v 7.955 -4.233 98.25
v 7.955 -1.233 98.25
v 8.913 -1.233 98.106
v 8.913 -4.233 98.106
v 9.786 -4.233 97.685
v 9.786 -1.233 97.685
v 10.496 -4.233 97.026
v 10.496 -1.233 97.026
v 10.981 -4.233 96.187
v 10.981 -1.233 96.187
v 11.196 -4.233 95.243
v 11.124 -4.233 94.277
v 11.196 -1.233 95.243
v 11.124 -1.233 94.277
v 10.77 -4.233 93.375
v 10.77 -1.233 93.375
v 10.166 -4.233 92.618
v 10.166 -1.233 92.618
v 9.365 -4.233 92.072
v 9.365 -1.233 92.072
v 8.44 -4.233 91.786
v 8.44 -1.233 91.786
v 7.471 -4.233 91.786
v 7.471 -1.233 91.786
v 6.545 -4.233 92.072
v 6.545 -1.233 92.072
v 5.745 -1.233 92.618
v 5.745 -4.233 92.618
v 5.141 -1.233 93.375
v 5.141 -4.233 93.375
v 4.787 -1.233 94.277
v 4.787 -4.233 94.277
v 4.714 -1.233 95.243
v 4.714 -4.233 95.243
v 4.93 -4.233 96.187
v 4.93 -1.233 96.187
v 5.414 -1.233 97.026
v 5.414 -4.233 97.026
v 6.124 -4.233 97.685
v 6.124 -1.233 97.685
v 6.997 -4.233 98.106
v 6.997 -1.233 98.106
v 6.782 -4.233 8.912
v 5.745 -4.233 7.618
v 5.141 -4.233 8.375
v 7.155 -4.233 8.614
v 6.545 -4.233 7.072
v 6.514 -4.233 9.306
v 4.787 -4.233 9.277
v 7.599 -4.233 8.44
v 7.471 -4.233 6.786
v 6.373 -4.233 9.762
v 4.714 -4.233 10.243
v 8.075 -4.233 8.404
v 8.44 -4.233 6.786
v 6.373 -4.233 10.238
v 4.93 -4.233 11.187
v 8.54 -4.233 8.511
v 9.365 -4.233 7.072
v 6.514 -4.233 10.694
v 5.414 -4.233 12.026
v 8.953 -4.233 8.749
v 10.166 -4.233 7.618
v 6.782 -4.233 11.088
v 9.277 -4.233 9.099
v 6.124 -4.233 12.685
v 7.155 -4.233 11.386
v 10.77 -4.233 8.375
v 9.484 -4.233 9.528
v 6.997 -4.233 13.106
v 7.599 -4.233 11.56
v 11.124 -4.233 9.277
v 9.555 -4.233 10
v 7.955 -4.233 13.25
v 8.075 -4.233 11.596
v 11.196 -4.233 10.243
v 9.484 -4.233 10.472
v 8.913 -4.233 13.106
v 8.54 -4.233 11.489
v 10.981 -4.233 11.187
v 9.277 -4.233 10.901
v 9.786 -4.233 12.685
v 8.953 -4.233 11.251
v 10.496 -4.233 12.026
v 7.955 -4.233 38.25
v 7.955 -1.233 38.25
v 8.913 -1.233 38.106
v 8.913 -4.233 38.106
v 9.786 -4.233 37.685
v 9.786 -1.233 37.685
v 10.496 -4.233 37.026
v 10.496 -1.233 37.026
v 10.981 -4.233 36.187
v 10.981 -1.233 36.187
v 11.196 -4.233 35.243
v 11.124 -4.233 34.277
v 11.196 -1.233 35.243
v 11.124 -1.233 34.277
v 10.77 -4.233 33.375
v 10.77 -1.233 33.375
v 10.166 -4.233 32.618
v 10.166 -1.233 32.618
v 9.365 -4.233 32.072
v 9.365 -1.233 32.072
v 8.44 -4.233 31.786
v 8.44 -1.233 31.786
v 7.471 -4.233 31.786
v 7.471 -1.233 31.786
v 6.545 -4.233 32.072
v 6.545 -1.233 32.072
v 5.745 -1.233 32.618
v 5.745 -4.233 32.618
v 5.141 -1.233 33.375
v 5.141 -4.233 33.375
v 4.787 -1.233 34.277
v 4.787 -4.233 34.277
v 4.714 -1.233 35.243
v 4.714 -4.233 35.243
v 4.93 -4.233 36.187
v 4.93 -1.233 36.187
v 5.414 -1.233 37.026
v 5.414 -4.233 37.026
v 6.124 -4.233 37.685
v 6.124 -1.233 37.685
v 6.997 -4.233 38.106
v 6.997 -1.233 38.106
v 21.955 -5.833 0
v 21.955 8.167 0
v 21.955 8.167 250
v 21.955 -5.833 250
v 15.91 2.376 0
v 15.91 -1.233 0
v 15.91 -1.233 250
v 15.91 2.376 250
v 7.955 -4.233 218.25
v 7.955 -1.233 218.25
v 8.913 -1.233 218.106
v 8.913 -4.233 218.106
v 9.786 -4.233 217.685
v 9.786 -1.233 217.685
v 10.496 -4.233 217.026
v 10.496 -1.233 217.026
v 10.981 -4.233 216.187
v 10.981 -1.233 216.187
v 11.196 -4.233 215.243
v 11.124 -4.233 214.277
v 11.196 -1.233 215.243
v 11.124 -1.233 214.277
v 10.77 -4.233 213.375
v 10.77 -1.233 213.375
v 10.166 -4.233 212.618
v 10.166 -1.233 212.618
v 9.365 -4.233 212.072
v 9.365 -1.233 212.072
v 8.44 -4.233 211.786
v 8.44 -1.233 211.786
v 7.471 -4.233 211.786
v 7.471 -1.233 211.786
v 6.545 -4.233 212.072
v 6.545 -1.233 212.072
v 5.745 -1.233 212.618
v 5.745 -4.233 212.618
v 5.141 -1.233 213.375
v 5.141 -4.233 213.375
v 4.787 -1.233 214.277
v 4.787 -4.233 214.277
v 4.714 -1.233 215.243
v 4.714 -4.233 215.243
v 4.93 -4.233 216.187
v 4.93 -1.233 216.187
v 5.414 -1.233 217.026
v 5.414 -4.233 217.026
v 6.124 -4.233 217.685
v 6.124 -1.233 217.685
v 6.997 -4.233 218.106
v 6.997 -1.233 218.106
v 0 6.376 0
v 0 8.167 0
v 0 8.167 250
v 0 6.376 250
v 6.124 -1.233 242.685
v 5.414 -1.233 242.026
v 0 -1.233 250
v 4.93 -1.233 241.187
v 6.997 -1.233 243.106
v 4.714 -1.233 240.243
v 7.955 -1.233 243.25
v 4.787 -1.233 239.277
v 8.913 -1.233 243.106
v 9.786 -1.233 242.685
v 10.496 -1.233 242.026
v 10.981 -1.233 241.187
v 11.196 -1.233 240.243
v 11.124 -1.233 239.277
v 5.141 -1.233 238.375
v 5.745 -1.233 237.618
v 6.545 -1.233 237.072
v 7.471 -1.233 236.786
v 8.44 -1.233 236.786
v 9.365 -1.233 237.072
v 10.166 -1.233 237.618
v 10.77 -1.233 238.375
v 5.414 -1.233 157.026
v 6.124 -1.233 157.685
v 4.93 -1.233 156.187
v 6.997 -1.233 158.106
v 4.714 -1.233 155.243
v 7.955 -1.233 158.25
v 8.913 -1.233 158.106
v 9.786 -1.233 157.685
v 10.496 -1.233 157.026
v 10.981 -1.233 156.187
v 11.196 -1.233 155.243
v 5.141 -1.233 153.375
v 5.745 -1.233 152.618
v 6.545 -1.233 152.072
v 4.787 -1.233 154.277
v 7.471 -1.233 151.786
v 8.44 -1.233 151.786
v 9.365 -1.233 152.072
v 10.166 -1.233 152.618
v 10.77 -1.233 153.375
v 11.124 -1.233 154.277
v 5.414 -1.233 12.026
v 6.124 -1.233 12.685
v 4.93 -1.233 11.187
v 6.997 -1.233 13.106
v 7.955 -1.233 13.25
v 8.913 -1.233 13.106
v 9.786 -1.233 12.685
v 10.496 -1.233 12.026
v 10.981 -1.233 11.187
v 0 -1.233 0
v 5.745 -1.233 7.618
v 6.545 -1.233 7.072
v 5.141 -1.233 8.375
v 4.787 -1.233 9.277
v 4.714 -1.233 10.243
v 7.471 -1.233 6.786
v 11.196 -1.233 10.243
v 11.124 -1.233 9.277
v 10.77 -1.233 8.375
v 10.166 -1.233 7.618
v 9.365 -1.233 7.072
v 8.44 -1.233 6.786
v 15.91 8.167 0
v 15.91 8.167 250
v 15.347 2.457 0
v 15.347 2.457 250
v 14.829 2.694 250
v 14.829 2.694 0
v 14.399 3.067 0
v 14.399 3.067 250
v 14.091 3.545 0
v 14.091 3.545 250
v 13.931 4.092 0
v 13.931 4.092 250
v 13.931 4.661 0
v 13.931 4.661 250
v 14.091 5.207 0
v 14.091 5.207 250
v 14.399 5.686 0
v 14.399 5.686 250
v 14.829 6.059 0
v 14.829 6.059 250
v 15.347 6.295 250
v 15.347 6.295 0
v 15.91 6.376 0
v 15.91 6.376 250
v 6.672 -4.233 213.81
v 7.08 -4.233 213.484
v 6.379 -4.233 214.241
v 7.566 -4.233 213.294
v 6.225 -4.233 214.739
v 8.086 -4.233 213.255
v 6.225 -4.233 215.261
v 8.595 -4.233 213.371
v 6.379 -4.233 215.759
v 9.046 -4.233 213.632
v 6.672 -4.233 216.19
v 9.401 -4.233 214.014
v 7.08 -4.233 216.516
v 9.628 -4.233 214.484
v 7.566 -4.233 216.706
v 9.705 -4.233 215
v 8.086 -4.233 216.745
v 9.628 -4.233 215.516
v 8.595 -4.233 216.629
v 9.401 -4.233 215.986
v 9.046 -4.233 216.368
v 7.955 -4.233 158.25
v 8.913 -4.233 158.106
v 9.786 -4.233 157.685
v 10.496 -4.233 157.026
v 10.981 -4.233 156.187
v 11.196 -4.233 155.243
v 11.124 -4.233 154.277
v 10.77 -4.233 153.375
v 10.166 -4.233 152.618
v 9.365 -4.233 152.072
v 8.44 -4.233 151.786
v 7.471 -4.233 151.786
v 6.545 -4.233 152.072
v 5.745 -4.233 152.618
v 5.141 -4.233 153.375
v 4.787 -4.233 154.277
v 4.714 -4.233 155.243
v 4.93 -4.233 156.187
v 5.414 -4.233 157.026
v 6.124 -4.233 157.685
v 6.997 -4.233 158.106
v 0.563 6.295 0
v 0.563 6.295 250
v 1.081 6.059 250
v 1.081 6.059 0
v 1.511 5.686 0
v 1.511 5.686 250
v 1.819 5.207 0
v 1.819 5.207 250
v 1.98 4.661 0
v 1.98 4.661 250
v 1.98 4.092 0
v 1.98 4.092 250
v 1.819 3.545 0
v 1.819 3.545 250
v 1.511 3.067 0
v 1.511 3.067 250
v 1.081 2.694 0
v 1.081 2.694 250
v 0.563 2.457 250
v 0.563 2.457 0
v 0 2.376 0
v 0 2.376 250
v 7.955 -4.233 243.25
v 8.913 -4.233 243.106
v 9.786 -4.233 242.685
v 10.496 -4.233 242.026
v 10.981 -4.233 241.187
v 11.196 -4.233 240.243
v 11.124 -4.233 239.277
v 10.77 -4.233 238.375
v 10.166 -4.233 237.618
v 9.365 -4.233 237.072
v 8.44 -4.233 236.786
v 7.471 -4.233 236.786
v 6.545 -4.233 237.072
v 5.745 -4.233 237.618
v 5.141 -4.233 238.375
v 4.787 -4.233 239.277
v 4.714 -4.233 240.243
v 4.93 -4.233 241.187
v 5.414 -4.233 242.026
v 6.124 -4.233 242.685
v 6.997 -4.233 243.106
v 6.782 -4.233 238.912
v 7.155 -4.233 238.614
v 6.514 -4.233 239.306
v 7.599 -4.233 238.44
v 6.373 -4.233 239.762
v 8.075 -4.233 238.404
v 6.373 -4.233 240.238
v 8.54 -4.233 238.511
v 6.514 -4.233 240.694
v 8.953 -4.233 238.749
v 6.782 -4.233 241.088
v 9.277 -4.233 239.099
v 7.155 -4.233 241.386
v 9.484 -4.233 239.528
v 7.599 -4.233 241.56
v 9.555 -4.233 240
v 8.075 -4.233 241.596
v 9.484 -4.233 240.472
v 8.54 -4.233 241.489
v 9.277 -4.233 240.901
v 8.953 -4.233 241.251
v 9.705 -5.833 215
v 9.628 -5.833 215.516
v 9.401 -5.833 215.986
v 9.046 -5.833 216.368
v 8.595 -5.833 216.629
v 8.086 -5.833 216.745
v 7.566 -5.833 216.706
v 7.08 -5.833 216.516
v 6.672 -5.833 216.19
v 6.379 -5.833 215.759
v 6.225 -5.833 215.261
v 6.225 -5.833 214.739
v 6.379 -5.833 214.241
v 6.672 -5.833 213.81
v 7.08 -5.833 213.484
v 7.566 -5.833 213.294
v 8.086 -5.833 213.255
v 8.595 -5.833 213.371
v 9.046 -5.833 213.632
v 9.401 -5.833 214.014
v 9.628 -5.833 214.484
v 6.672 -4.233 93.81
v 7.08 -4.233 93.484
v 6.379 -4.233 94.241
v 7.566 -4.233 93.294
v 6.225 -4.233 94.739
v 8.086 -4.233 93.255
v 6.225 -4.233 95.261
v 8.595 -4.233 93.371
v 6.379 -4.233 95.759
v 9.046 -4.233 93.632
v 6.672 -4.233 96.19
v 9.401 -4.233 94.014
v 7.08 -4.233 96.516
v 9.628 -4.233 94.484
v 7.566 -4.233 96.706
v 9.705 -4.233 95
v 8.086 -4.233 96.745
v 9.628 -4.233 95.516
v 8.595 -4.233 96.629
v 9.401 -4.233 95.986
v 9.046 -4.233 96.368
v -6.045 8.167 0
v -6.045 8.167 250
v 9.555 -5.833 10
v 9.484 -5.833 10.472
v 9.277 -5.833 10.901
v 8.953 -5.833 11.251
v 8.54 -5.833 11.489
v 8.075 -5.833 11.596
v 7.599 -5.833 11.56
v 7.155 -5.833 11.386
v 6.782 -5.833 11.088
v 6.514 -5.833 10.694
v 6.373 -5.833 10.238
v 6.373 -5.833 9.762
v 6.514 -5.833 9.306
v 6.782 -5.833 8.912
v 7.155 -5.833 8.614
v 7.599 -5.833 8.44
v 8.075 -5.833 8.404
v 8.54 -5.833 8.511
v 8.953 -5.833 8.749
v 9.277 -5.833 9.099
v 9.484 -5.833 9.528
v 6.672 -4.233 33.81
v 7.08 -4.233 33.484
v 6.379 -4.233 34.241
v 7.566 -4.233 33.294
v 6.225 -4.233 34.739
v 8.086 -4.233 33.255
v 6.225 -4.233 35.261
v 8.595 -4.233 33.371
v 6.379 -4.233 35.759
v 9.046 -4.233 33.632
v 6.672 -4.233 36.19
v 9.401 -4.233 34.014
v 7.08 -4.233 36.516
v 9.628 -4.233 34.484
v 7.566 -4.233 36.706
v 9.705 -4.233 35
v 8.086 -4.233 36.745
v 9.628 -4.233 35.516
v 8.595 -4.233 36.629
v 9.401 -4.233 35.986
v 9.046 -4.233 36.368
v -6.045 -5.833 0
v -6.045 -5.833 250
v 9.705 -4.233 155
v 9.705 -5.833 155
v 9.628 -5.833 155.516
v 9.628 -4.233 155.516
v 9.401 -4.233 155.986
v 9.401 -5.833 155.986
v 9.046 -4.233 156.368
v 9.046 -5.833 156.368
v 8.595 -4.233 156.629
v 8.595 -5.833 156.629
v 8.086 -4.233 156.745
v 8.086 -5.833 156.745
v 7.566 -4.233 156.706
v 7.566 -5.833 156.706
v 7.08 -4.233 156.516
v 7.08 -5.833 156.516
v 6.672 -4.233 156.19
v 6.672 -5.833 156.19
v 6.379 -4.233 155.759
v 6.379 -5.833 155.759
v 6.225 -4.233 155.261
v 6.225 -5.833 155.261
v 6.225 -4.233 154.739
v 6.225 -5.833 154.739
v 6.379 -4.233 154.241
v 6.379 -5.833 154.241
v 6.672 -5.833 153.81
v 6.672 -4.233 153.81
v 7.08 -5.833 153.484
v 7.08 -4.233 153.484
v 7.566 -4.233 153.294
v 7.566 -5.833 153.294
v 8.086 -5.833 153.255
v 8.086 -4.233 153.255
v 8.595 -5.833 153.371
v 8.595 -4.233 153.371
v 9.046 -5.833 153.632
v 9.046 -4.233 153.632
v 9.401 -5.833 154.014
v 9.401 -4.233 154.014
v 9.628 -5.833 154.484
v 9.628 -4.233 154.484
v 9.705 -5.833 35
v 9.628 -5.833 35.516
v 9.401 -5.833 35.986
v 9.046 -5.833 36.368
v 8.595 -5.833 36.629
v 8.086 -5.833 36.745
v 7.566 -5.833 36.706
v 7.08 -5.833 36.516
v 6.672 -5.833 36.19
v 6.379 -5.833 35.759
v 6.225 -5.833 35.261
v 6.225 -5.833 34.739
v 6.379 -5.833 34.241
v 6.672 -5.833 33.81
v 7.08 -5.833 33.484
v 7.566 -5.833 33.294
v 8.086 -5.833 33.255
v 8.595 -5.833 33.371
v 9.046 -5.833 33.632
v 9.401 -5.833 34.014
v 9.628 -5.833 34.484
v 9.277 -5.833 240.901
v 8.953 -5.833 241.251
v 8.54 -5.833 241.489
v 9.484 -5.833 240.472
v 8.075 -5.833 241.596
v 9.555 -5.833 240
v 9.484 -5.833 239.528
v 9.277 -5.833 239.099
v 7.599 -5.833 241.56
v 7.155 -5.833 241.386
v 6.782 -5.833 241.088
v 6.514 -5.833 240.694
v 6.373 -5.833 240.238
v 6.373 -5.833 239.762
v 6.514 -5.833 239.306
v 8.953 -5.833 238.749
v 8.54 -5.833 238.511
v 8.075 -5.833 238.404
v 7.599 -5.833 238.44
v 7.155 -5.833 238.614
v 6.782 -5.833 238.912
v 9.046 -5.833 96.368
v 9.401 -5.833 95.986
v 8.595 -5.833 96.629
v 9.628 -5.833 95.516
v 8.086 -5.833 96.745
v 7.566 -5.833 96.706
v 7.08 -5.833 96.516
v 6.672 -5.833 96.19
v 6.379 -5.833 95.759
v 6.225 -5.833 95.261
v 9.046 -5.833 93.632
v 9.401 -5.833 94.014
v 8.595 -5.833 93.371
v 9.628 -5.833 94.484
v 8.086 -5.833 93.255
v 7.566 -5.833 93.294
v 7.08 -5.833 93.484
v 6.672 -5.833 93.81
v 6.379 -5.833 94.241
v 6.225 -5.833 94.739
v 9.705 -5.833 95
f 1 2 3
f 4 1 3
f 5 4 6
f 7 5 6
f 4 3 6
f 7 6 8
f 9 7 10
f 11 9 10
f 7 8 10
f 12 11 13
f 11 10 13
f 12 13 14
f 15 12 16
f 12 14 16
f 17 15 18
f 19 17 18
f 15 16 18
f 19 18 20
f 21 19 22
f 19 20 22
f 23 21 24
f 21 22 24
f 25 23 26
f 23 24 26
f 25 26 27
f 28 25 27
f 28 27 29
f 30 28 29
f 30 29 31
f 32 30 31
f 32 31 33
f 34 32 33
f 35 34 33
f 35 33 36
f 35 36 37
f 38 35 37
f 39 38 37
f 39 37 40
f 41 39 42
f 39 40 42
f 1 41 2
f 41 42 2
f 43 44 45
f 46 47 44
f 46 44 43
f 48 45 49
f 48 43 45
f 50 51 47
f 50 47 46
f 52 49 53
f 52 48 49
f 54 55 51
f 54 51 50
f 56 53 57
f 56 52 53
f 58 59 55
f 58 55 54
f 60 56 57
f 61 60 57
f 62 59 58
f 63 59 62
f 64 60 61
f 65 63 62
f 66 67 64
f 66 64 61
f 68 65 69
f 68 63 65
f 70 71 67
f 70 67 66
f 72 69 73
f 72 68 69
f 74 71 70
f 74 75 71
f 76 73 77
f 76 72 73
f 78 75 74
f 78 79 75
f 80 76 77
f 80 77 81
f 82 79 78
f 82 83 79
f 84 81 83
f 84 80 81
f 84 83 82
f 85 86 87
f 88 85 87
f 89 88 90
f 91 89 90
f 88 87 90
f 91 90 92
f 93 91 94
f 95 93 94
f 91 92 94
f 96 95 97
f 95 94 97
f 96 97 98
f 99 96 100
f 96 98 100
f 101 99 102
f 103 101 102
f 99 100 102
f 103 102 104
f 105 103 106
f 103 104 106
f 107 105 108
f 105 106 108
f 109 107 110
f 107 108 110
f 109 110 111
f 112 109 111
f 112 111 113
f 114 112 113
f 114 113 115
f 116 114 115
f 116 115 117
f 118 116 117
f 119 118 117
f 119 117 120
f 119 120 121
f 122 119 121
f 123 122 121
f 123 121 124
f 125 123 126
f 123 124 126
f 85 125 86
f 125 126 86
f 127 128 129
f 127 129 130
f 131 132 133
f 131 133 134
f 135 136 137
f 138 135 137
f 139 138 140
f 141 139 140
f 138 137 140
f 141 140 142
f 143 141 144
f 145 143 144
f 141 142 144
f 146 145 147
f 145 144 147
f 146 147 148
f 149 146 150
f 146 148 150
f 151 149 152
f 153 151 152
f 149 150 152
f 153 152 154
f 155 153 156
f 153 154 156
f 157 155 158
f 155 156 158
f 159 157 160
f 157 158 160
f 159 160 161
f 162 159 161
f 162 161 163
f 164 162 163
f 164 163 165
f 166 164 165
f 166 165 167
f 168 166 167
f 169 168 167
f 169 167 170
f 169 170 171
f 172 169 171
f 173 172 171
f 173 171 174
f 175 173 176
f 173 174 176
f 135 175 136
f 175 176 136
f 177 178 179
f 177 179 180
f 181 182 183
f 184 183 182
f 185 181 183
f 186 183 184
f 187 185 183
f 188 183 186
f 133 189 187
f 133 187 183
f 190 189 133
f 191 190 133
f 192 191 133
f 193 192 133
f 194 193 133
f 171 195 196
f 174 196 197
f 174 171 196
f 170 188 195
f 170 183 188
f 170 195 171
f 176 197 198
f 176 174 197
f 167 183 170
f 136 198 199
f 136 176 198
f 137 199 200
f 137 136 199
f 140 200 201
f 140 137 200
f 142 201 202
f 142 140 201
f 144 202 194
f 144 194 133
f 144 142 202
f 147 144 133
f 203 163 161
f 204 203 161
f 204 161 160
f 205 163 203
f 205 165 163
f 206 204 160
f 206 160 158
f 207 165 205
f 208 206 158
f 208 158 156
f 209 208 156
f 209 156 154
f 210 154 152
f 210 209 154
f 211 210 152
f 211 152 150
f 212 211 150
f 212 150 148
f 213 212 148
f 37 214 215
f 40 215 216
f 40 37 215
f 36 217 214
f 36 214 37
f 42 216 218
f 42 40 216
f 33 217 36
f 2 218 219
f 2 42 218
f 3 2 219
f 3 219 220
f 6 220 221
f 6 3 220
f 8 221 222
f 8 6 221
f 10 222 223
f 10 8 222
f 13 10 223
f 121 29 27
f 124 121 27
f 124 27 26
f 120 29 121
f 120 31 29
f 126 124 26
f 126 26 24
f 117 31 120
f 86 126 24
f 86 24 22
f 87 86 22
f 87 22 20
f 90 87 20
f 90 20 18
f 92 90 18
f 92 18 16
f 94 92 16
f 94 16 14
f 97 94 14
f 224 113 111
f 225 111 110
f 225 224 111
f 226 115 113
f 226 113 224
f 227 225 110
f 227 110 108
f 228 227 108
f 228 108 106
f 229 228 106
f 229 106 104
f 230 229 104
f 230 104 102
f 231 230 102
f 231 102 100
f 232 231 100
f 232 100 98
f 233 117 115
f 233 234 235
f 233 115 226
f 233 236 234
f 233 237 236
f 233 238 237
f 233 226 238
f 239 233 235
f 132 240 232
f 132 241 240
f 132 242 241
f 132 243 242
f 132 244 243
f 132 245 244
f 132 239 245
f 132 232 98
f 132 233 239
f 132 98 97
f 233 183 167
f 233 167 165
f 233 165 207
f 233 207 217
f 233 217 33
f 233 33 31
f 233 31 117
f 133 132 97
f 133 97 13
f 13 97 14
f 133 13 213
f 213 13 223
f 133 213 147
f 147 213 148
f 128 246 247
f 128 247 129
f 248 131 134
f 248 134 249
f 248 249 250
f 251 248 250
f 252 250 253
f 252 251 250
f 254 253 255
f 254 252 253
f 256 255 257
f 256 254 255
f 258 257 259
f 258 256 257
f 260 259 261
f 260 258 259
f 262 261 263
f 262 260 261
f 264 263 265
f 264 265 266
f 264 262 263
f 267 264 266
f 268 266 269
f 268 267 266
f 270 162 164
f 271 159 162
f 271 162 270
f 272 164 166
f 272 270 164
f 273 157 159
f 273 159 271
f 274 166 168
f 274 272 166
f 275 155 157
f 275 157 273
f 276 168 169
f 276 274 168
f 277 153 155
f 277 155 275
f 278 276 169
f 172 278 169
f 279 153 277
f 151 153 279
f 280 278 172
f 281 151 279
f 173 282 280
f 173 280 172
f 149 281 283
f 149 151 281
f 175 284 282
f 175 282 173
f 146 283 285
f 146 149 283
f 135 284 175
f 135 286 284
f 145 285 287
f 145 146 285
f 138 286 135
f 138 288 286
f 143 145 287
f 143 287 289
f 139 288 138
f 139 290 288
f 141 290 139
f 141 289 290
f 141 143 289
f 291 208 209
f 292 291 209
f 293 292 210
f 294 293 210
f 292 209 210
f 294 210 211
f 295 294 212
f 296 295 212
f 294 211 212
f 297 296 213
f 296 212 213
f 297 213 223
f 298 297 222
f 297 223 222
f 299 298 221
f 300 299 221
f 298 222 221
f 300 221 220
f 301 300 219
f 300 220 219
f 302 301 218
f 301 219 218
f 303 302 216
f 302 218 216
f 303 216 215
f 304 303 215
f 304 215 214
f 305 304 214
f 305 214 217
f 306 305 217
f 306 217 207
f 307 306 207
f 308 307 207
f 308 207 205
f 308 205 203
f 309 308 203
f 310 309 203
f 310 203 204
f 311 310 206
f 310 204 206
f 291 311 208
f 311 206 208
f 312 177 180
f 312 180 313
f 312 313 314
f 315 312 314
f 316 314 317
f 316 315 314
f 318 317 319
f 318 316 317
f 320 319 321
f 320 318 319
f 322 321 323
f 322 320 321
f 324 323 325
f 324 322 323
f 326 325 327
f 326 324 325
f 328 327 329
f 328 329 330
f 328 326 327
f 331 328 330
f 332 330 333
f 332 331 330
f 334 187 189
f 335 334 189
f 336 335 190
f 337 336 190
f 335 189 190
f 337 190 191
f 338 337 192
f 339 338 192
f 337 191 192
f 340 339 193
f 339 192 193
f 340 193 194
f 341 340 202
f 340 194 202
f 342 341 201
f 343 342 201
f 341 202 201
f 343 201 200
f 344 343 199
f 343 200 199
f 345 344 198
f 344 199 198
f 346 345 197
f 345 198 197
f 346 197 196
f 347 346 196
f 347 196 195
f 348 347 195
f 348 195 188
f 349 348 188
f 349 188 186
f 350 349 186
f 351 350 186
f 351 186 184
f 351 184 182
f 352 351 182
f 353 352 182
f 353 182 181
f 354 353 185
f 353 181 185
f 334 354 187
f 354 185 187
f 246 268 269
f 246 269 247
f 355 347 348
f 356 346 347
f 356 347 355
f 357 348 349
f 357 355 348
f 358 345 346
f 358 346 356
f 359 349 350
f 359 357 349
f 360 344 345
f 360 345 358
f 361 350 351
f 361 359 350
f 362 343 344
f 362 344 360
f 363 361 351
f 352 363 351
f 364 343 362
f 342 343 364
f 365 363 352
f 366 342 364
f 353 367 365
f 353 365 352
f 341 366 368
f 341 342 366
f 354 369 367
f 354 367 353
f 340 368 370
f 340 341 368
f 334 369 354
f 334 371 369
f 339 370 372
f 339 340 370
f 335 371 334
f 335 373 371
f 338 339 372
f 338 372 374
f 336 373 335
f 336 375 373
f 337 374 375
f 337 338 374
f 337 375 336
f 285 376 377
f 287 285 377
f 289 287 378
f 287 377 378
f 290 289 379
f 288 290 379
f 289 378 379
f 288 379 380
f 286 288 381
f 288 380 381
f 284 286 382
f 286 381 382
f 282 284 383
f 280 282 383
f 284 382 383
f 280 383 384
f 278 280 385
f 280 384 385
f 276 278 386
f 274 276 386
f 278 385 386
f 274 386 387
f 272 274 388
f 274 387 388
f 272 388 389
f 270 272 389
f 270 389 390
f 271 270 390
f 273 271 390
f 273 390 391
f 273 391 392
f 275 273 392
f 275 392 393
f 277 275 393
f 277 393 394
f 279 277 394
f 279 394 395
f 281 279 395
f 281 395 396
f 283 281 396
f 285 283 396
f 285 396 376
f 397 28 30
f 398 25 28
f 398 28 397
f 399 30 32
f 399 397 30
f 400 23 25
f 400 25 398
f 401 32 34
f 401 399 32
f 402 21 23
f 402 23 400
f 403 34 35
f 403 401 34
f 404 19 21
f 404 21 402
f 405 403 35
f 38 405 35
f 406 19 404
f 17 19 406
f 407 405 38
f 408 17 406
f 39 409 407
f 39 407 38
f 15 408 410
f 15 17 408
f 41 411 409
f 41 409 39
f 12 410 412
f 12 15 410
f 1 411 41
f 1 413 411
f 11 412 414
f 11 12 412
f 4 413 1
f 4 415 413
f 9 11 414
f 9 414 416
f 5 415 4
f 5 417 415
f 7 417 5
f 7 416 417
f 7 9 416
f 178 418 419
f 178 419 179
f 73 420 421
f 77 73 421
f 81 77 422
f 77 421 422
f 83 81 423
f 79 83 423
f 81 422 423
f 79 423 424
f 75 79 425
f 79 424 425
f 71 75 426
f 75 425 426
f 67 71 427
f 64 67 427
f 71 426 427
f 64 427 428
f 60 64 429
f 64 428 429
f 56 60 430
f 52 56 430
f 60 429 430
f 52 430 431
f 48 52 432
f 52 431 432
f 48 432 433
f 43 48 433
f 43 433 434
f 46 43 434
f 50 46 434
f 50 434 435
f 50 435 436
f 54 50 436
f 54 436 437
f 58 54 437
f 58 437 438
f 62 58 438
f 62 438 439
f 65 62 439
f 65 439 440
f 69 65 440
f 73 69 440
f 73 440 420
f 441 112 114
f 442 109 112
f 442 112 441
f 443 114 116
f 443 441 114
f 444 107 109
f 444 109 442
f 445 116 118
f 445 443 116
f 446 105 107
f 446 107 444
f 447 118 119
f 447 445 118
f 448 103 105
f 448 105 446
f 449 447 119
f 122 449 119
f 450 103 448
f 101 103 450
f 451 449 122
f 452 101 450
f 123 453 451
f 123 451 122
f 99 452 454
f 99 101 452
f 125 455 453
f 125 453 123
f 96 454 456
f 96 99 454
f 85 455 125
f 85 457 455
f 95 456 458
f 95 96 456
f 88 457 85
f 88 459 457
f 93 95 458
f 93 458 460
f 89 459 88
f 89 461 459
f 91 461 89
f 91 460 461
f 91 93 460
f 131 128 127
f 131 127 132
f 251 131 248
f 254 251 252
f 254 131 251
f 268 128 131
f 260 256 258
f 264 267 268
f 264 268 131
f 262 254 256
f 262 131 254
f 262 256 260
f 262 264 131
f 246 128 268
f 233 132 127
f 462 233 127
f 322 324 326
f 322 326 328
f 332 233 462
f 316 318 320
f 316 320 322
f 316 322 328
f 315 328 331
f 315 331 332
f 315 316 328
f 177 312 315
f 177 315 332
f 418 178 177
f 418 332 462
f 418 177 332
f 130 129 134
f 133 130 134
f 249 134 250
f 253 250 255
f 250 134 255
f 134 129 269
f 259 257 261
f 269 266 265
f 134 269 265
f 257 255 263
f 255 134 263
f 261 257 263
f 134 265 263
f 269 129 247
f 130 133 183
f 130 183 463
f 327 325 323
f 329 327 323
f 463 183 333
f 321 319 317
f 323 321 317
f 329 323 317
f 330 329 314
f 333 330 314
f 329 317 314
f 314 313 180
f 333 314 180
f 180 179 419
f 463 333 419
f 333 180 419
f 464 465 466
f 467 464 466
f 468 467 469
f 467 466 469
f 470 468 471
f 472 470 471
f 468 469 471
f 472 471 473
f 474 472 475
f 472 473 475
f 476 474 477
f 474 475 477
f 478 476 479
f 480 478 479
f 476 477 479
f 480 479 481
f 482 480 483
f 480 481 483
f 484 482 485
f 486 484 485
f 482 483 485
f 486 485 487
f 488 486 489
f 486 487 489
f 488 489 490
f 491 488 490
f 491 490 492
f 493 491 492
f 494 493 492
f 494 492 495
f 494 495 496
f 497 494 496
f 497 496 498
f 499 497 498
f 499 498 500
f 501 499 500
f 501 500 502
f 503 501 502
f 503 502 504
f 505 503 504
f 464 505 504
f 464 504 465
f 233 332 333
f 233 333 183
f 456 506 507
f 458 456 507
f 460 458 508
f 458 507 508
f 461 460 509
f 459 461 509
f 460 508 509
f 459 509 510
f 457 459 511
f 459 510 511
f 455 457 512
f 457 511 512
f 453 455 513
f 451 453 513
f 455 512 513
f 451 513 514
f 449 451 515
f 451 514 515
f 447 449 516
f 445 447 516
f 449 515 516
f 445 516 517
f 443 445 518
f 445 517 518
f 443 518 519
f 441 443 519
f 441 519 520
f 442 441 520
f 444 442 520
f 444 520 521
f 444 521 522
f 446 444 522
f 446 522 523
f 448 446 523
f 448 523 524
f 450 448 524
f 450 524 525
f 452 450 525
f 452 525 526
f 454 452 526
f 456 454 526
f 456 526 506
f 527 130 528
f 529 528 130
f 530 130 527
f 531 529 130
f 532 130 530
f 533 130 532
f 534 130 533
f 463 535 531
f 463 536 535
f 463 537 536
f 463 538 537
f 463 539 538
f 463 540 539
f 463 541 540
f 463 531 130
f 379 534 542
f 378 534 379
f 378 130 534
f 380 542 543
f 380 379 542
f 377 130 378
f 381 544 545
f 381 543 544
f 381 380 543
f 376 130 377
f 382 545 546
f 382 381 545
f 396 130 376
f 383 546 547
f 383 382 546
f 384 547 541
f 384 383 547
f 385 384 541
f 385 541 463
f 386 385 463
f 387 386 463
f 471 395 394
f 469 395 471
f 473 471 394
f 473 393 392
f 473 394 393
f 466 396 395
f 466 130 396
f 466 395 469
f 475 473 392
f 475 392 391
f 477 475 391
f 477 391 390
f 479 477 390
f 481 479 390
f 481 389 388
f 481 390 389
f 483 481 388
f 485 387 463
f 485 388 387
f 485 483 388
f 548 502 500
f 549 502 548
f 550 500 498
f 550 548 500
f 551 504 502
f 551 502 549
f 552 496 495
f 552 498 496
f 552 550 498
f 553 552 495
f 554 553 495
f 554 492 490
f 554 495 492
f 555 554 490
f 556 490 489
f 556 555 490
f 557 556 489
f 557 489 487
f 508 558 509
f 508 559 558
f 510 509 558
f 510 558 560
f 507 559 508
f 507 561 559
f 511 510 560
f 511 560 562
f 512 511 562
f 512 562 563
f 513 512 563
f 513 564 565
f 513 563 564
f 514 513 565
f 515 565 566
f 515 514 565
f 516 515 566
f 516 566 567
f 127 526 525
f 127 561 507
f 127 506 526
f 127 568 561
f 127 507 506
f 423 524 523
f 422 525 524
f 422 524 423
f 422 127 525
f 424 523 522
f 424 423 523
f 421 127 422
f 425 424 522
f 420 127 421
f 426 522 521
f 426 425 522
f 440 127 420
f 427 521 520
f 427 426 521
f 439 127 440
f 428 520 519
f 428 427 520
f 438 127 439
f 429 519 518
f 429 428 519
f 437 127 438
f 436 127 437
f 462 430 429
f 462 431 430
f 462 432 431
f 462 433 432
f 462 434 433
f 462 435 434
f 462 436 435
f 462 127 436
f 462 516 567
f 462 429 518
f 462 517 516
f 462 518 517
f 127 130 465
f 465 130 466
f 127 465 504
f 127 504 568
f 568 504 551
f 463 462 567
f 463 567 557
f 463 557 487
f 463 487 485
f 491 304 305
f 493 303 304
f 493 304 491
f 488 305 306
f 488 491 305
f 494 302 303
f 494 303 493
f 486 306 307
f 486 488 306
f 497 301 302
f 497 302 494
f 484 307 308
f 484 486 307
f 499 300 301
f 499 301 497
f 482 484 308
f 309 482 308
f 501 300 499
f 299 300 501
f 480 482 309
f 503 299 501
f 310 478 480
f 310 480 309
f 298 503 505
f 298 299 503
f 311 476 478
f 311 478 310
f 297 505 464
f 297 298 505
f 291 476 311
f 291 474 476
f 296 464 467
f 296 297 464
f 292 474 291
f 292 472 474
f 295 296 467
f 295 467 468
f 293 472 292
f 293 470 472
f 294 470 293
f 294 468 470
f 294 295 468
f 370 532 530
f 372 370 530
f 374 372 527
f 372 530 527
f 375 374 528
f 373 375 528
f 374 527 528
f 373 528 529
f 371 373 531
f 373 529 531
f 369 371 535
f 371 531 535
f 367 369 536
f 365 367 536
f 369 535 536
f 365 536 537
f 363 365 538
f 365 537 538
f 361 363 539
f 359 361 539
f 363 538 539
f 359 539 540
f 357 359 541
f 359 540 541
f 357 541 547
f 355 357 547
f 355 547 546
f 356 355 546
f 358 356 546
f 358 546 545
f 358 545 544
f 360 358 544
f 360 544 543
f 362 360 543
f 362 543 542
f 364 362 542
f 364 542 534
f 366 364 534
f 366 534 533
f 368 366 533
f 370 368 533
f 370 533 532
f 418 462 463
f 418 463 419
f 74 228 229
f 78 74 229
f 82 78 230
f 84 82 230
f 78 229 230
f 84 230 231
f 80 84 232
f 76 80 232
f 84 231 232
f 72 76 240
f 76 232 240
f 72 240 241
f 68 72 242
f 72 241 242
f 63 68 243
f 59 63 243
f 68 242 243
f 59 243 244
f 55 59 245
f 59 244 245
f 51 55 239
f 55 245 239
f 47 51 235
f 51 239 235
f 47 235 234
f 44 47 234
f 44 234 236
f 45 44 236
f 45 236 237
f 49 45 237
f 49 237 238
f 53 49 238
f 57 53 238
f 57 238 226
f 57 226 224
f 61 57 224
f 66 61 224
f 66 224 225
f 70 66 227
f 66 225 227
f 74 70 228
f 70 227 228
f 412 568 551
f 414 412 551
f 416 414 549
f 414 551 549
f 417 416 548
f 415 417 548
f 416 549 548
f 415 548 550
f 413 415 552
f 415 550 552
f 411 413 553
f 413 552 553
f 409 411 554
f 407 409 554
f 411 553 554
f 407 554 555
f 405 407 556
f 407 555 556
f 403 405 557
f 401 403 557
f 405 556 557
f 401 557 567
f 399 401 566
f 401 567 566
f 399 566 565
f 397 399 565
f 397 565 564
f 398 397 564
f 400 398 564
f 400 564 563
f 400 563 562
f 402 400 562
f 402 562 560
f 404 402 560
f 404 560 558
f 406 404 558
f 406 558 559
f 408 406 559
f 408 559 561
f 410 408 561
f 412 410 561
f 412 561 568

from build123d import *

# Parameters (mm, degrees)
EXTRUDE_1_DEPTH     = 250
SKETCH_2_R          = 1.75
SKETCH_2_R_2        = 1.6
CUT_EXTRUDE_1_DEPTH = 252.352407907
SKETCH_3_R          = 3.25
CUT_EXTRUDE_2_DEPTH = 3


with BuildPart() as part:
    # 草图1 → 凸台-拉伸1 (new body)
    with BuildSketch(Plane.XY):
        with BuildLine():
            Line((-6.044750958, 8.167376983), (0, 8.167376983))
            Line((0, 8.167376983), (0, 6.376329748))
            ThreePointArc((0, 6.376329748), (2, 4.376329748), (0, 2.376329748))
            Line((0, 2.376329748), (0, -1.232623017))
            Line((0, -1.232623017), (15.910498084, -1.232623017))
            Line((15.910498084, -1.232623017), (15.910498084, 2.376329748))
            ThreePointArc((15.910498084, 2.376329748), (13.910498084, 4.376329748), (15.910498084, 6.376329748))
            Line((15.910498084, 6.376329748), (15.910498084, 8.167376983))
            Line((15.910498084, 8.167376983), (21.955249042, 8.167376983))
            Line((21.955249042, 8.167376983), (21.955249042, -5.832623017))
            Line((21.955249042, -5.832623017), (-6.044750958, -5.832623017))
            Line((-6.044750958, -5.832623017), (-6.044750958, 8.167376983))
        make_face()
    extrude(amount=EXTRUDE_1_DEPTH)

    # 草图2 → 切除-拉伸1 (cut, through all)
    with BuildSketch(Plane.XZ.offset(5.832623017)):
        with Locations((7.955249042, 215)):
            Circle(SKETCH_2_R)
        with Locations((7.955249042, 155)):
            Circle(SKETCH_2_R)
        with Locations((7.955249042, 95)):
            Circle(SKETCH_2_R)
        with Locations((7.955249042, 35)):
            Circle(SKETCH_2_R)
        with Locations((7.955249042, -25)):
            Circle(SKETCH_2_R)
        with Locations((7.955249042, -85)):
            Circle(SKETCH_2_R)
        with Locations((7.955249042, 10)):
            Circle(SKETCH_2_R_2)
        with Locations((7.955249042, 240)):
            Circle(SKETCH_2_R_2)
    extrude(amount=-CUT_EXTRUDE_1_DEPTH, mode=Mode.SUBTRACT)

    # 草图3 → 切除-拉伸2 (cut)
    with BuildSketch(Plane(origin=(0, -1.232623017, 0), x_dir=(1, 0, 0), z_dir=(0, 1, 0))):
        with Locations(Location((7.955249042, -35, 0), (0, 0, 270))):
            Circle(SKETCH_3_R)
        with Locations(Location((7.955249042, -95, 0), (0, 0, 270))):
            Circle(SKETCH_3_R)
        with Locations(Location((7.955249042, -155, 0), (0, 0, 270))):
            Circle(SKETCH_3_R)
        with Locations(Location((7.955249042, -215, 0), (0, 0, 270))):
            Circle(SKETCH_3_R)
        with Locations((7.955249042, -275)):
            Circle(SKETCH_3_R)
        with Locations(Location((7.955249042, -240, 0), (0, 0, 270))):
            Circle(SKETCH_3_R)
        with Locations(Location((7.955249042, -10, 0), (0, 0, 270))):
            Circle(SKETCH_3_R)
    extrude(amount=-CUT_EXTRUDE_2_DEPTH, mode=Mode.SUBTRACT)


solid = part.part
